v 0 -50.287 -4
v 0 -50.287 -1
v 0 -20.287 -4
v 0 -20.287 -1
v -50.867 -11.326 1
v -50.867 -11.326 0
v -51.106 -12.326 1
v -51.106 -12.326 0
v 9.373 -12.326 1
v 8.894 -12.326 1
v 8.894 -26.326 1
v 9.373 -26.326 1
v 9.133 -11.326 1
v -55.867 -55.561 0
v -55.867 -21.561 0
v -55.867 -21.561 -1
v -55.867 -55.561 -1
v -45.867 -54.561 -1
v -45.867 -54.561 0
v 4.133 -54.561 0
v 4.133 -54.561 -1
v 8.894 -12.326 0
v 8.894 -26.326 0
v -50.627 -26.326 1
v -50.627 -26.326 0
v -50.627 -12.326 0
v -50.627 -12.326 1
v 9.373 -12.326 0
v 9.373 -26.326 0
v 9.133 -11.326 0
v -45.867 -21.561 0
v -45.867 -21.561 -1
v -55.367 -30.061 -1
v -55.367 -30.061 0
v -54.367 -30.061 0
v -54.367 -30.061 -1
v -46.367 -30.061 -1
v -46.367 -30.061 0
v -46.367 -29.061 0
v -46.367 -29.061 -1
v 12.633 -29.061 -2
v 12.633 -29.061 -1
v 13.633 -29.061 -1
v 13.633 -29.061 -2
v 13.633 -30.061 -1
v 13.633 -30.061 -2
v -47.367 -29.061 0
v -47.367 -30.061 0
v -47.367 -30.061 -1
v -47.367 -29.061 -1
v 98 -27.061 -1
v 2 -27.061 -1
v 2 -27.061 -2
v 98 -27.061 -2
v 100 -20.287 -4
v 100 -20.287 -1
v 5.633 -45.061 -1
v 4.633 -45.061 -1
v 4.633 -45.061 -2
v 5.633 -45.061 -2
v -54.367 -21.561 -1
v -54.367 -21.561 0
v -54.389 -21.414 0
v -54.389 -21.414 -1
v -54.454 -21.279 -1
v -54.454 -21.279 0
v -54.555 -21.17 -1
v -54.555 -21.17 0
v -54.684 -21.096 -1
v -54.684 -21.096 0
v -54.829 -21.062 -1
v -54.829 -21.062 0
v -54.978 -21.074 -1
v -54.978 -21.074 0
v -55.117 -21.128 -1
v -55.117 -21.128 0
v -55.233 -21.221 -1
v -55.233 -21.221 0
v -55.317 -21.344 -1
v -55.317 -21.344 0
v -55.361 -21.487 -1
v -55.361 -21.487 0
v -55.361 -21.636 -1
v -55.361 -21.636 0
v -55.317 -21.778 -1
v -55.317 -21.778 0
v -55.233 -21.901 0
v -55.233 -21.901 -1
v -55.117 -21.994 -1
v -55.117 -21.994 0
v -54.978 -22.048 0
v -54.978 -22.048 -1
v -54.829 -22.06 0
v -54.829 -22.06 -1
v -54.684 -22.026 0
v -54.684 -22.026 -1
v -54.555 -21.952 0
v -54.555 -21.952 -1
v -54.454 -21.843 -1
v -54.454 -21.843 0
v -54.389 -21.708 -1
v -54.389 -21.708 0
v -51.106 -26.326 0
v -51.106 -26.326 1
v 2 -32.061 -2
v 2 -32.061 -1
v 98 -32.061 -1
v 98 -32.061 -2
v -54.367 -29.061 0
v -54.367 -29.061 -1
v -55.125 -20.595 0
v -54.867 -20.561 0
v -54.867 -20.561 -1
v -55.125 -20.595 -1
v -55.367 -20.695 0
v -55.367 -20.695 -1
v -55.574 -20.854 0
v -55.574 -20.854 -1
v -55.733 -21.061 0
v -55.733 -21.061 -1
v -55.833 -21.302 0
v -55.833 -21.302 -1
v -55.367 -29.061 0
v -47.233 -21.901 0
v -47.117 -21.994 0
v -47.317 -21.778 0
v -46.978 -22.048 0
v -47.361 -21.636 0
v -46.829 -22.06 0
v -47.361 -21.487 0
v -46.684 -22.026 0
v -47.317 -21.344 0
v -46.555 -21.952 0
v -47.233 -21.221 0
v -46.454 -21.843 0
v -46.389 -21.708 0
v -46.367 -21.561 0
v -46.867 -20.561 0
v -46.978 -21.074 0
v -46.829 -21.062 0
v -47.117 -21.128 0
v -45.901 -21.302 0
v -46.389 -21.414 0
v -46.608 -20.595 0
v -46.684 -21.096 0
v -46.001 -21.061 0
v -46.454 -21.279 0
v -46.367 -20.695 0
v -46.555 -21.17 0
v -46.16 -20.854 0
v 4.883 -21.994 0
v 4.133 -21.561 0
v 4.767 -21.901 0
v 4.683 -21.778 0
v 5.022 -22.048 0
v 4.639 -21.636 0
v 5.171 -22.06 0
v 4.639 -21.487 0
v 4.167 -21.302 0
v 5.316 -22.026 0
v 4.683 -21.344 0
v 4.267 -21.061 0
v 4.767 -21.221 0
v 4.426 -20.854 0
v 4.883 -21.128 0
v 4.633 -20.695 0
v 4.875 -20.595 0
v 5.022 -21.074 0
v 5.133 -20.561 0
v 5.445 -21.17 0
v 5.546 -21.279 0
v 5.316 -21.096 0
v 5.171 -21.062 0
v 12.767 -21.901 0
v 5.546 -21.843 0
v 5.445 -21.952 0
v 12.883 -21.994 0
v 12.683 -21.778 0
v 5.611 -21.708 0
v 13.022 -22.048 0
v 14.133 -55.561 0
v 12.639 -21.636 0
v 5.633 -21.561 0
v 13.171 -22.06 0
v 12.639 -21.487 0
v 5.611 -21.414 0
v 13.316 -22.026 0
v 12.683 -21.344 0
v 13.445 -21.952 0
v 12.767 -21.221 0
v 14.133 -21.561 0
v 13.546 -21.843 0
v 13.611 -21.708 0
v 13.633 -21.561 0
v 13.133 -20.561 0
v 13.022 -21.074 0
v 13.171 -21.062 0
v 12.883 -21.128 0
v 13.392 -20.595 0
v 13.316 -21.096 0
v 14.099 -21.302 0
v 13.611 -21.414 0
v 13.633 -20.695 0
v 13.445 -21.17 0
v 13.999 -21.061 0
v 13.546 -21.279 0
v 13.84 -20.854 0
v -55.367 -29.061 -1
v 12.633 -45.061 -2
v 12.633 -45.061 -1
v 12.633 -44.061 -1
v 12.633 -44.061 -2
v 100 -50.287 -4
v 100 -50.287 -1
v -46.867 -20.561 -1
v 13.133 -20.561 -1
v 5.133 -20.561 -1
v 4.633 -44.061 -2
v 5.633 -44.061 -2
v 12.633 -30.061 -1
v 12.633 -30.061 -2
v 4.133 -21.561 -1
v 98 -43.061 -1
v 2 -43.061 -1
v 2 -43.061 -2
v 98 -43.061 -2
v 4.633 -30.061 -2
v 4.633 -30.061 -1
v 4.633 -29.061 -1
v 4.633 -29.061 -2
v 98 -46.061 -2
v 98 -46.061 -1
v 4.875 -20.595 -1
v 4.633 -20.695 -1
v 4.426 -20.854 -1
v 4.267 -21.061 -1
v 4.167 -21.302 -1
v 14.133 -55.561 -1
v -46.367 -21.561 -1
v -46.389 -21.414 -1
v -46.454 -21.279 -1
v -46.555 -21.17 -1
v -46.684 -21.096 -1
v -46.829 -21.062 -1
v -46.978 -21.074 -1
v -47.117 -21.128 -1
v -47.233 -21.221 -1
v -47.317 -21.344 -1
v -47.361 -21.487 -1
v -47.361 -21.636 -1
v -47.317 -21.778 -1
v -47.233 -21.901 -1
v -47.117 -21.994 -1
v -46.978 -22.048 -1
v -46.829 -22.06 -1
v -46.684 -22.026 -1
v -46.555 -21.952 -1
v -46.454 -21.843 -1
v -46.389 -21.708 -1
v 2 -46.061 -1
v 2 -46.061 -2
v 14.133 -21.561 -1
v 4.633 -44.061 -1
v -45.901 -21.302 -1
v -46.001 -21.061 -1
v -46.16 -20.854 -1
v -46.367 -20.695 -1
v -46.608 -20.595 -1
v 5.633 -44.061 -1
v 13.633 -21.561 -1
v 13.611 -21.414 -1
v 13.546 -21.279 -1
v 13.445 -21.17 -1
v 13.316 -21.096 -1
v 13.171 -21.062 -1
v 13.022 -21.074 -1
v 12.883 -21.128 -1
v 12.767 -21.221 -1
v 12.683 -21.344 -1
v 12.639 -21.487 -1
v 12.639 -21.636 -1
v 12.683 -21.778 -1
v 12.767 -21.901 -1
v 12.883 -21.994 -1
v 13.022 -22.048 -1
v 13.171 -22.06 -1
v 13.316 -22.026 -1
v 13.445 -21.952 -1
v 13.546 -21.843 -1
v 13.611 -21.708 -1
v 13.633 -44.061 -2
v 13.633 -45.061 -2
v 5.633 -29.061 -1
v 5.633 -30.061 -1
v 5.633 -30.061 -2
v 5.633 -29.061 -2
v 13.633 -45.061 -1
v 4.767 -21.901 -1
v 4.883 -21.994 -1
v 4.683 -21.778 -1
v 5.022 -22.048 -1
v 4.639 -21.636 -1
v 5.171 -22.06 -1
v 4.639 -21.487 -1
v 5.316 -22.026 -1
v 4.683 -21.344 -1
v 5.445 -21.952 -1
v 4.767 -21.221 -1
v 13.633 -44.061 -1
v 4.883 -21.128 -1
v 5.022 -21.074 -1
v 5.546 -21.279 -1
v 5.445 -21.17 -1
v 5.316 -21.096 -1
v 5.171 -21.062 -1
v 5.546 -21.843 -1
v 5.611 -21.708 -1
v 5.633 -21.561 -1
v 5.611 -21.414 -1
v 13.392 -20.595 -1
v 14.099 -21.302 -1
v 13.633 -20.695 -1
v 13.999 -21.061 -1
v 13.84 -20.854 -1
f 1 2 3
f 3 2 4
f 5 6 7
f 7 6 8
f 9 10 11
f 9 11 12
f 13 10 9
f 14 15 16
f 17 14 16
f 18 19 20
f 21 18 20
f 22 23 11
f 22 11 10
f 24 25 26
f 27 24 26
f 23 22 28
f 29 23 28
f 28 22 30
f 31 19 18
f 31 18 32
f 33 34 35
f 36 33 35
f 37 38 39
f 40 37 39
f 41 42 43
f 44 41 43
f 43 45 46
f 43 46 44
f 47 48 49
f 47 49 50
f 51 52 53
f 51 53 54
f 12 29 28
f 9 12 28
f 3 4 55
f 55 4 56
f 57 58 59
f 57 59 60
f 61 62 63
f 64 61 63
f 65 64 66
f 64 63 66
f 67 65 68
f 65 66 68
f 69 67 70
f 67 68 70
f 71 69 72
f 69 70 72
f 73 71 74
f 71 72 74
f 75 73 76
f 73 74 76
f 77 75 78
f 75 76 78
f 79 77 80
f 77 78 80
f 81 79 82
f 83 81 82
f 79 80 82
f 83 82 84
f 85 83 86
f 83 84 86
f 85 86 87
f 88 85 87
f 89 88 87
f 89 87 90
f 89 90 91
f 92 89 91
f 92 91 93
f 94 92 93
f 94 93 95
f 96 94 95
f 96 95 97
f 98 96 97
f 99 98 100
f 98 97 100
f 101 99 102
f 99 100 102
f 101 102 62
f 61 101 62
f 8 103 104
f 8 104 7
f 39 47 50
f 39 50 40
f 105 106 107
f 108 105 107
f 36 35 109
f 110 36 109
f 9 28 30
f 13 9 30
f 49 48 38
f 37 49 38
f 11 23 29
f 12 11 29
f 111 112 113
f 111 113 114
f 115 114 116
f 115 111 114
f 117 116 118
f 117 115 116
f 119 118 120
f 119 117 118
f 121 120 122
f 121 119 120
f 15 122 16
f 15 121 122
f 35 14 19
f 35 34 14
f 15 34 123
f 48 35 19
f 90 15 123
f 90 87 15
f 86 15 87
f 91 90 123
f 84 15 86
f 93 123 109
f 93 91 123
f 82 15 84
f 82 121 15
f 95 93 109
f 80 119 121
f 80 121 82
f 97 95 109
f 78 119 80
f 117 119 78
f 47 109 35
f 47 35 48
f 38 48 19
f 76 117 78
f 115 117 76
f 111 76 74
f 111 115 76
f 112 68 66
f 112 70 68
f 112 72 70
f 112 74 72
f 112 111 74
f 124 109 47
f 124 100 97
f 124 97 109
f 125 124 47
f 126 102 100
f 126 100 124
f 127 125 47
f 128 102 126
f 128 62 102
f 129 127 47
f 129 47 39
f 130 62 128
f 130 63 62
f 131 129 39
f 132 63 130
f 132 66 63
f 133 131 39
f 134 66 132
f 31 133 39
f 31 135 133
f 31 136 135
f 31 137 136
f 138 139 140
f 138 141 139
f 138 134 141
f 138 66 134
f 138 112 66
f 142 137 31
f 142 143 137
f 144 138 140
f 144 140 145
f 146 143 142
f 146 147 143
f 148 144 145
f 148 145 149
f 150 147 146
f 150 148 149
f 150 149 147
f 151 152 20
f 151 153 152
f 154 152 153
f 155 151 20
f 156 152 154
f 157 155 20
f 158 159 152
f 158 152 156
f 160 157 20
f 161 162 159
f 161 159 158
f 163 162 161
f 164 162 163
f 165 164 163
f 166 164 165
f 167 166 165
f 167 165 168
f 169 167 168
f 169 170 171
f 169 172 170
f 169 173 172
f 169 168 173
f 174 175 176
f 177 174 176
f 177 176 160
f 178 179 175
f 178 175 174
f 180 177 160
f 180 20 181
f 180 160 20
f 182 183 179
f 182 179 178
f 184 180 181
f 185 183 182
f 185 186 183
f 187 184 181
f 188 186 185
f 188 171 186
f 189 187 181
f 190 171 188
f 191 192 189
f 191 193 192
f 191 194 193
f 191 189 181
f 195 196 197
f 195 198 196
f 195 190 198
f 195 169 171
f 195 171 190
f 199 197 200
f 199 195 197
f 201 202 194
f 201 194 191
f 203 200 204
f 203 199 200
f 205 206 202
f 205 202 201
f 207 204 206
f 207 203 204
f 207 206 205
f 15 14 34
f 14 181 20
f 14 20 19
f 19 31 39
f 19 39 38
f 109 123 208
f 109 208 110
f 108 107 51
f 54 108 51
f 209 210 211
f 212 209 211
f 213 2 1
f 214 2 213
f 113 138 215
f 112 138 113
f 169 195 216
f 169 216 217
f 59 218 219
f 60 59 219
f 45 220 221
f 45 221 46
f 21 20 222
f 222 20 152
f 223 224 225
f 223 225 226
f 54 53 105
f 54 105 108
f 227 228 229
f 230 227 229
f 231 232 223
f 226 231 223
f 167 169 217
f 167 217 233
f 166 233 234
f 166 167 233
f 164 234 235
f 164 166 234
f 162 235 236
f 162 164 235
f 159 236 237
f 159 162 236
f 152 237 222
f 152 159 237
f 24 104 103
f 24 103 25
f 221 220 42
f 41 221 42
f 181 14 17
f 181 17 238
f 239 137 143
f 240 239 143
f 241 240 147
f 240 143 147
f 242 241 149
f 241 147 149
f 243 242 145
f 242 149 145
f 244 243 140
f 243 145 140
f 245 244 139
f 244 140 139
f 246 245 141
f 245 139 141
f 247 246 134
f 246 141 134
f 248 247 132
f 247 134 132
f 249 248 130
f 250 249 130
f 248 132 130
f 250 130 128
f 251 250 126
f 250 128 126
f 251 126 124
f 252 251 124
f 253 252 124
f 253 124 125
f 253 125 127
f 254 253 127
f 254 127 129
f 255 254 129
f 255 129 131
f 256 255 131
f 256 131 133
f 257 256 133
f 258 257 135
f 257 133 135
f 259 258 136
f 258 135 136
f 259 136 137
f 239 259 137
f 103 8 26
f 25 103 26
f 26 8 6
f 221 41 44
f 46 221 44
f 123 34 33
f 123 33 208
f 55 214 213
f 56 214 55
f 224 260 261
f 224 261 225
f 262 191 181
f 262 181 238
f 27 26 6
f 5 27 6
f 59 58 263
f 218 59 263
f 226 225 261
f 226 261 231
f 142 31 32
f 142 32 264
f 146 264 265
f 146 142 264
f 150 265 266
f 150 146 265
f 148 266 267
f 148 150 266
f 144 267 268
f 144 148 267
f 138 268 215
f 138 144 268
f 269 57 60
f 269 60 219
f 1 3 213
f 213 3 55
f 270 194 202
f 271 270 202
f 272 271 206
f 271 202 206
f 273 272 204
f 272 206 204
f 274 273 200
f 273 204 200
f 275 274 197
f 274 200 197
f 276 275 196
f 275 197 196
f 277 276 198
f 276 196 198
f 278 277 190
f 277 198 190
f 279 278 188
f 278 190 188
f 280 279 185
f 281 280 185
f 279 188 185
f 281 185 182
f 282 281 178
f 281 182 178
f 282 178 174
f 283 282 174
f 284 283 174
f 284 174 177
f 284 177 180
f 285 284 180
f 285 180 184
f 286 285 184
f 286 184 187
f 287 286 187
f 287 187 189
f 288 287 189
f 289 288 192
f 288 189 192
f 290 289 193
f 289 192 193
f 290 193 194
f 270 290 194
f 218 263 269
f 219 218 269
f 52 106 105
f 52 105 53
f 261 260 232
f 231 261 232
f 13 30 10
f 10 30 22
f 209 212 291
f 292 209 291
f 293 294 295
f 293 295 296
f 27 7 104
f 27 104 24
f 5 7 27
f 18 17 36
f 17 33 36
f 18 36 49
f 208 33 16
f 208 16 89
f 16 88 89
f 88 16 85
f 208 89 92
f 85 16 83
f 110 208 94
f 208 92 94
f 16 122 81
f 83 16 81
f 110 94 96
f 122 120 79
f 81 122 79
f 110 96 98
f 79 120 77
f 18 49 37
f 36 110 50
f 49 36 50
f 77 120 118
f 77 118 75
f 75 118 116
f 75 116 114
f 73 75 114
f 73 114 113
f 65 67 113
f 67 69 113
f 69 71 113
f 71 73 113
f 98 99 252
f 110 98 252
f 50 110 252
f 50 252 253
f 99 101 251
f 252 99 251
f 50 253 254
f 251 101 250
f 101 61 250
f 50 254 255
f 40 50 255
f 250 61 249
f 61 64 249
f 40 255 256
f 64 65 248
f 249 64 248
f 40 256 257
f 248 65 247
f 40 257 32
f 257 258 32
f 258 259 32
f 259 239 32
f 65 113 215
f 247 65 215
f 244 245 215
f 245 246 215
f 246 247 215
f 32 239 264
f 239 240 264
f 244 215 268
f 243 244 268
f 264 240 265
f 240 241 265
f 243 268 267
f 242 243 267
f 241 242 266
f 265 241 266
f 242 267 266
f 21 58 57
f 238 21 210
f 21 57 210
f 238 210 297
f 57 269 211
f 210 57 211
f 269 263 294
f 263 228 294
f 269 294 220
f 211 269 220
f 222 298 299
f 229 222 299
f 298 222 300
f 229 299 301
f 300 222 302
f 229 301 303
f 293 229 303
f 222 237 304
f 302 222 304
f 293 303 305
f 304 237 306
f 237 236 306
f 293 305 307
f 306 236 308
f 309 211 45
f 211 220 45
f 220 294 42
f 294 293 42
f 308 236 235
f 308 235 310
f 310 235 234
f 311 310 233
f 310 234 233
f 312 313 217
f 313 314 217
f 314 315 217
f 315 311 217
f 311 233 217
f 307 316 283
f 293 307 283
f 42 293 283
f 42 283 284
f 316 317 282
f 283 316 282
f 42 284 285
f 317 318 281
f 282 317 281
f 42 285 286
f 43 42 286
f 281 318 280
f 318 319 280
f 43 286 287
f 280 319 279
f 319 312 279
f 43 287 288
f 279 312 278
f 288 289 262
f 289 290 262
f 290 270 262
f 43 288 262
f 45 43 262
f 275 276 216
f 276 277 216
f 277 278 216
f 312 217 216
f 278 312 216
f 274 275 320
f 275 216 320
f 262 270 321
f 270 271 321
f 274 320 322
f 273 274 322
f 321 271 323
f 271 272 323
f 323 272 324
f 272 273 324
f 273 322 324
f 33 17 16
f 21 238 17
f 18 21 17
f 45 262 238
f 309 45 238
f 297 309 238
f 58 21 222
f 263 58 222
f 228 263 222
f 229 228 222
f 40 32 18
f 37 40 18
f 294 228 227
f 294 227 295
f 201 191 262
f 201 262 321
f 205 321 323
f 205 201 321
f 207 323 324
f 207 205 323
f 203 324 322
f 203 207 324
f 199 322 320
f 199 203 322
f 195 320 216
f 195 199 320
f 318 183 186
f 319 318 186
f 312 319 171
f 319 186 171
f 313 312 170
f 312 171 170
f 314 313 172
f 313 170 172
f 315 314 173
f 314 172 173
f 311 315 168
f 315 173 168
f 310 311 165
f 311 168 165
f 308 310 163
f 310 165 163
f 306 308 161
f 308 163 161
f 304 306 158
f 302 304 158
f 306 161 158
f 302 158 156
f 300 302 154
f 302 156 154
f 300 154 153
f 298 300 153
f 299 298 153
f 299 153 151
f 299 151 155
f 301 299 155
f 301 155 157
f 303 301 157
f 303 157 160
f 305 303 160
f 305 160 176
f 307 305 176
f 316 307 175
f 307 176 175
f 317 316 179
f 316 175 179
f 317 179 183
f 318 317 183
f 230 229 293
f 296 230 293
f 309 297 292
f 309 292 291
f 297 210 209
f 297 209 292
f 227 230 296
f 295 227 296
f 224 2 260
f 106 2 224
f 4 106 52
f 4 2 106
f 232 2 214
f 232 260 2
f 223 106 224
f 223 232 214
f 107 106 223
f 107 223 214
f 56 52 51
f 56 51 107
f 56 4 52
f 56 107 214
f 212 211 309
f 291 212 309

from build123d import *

# Parameters (mm, degrees)
F0_W      = 1
F0_H      = 1
F0_R      = 0.5
F0_W_2    = 50
F0_H_2    = 4.5
F1_DEPTH  = 1
F2_W      = 0.4784071445
F2_H      = 14
F3_DEPTH  = 1
F5_START  = -1
F4_W      = 100
F4_H      = 30
F4_W_2    = 96
F4_H_2    = 3
F4_H_3    = 5
F5_DEPTH  = 3
F6_DEPTH  = 25
F7_DEPTH  = 2
F8_DEPTH  = 2
F9_W      = 50
F9_H      = 28.5
F10_DEPTH = 25


with BuildPart() as f1:
    # F0 (on Top) → F1 (new body)
    with BuildSketch(Plane.XY):
        with BuildLine():
            Line((4.1333548725, -26.0610329807), (4.1333548725, -30.5610329807))
            Line((4.1333548725, -30.5610329807), (14.1333548725, -30.5610329807))
            Line((14.1333548725, -30.5610329807), (14.1333548725, -21.5610329807))
            ThreePointArc((14.1333548725, -21.5610329807), (13.8404616537, -20.8539261995), (13.1333548725, -20.5610329807))
            Line((13.1333548725, -20.5610329807), (5.1333548725, -20.5610329807))
            ThreePointArc((5.1333548725, -20.5610329807), (4.4262480913, -20.8539261995), (4.1333548725, -21.5610329807))
            Line((4.1333548725, -21.5610329807), (4.1333548725, -26.0610329807))
        make_face()
        with Locations((5.1333548725, -29.5610329807)):
            Rectangle(F0_W, F0_H, mode=Mode.SUBTRACT)
        with Locations((13.1333548725, -29.5610329807)):
            Rectangle(F0_W, F0_H, mode=Mode.SUBTRACT)
        with Locations((5.1333548725, -21.5610329807)):
            Circle(F0_R, mode=Mode.SUBTRACT)
        with Locations((13.1333548725, -21.5610329807)):
            Circle(F0_R, mode=Mode.SUBTRACT)
        with BuildLine():
            Line((-55.8666451275, -30.5610329807), (-45.8666451275, -30.5610329807))
            Line((-45.8666451275, -30.5610329807), (-45.8666451275, -26.0610329807))
            Line((-45.8666451275, -26.0610329807), (-45.8666451275, -21.5610329807))
            ThreePointArc((-45.8666451275, -21.5610329807), (-46.1595383463, -20.8539261995), (-46.8666451275, -20.5610329807))
            Line((-46.8666451275, -20.5610329807), (-54.8666451275, -20.5610329807))
            ThreePointArc((-54.8666451275, -20.5610329807), (-55.5737519087, -20.8539261995), (-55.8666451275, -21.5610329807))
            Line((-55.8666451275, -21.5610329807), (-55.8666451275, -30.5610329807))
        make_face()
        with Locations((-54.8666451275, -29.5610329807)):
            Rectangle(F0_W, F0_H, mode=Mode.SUBTRACT)
        with Locations((-46.8666451275, -29.5610329807)):
            Rectangle(F0_W, F0_H, mode=Mode.SUBTRACT)
        with Locations((-54.8666451275, -21.5610329807)):
            Circle(F0_R, mode=Mode.SUBTRACT)
        with Locations((-46.8666451275, -21.5610329807)):
            Circle(F0_R, mode=Mode.SUBTRACT)
        with Locations((-20.8666451275, -28.3110329807)):
            Rectangle(F0_W_2, F0_H_2)
    extrude(amount=-F1_DEPTH)

    # F6 (add): a face of the model
    f6_faces = [f1.faces().sort_by_distance(p)[0] for p in [
        (-20.8666451275, -30.5610329807, -0.5),
    ]]
    extrude(f6_faces, amount=F6_DEPTH)

    # F0 (on Top) → F8 (join, through all)
    with BuildSketch(Plane.XY):
        with Locations((13.1333548725, -44.5610329807)):
            Rectangle(F0_W, F0_H)
        with Locations((5.1333548725, -44.5610329807)):
            Rectangle(F0_W, F0_H)
        with Locations((5.1333548725, -29.5610329807)):
            Rectangle(F0_W, F0_H)
        with Locations((13.1333548725, -29.5610329807)):
            Rectangle(F0_W, F0_H)
    extrude(amount=-F8_DEPTH)

    # F9 (on face) → F10 (cut)
    with BuildSketch(Plane.XY):
        with Locations((-20.8666451275, -40.3110329807)):
            Rectangle(F9_W, F9_H)
    extrude(amount=-F10_DEPTH, mode=Mode.SUBTRACT)


with BuildPart() as f3:
    # F2 (on face) → F3 (new body)
    with BuildSketch(Plane.XY):
        Polygon((9.3725584447, -12.3256136095), (9.1333548725, -11.3256136095), (8.8941513002, -12.3256136095), align=None)
        with Locations((9.1333548725, -19.3256136095)):
            Rectangle(F2_W, F2_H)
    extrude(amount=F3_DEPTH)


with BuildPart() as f3b:
    # F2 (on face) → F3, piece 2 (new body)
    with BuildSketch(Plane.XY):
        Polygon((-51.1058486998, -12.3256136095), (-50.6274415553, -12.3256136095), (-50.8666451275, -11.3256136095), align=None)
        with Locations((-50.8666451275, -19.3256136095)):
            Rectangle(F2_W, F2_H)
    extrude(amount=F3_DEPTH)


with BuildPart() as f5:
    # F4 (on Top) → F5 (new body)
    with BuildSketch(Plane.XY.offset(F5_START)):
        with Locations((50, -35.2865339816)):
            Rectangle(F4_W, F4_H)
        with Locations((50, -44.5610329807)):
            Rectangle(F4_W_2, F4_H_2, mode=Mode.SUBTRACT)
        with Locations((50, -29.5610329807)):
            Rectangle(F4_W_2, F4_H_3, mode=Mode.SUBTRACT)
        with Locations((50, -44.5610329807)):
            Rectangle(F4_W_2, F4_H_2)
        with Locations((50, -29.5610329807)):
            Rectangle(F4_W_2, F4_H_3)
    extrude(amount=-F5_DEPTH)

    # F4 (on Top) → F7 (cut)
    with BuildSketch(Plane.XY):
        with Locations((50, -29.5610329807)):
            Rectangle(F4_W_2, F4_H_3)
        with Locations((50, -44.5610329807)):
            Rectangle(F4_W_2, F4_H_2)
    extrude(amount=-F7_DEPTH, mode=Mode.SUBTRACT)


solid = Compound([f1.part, f3.part, f3b.part, f5.part])
